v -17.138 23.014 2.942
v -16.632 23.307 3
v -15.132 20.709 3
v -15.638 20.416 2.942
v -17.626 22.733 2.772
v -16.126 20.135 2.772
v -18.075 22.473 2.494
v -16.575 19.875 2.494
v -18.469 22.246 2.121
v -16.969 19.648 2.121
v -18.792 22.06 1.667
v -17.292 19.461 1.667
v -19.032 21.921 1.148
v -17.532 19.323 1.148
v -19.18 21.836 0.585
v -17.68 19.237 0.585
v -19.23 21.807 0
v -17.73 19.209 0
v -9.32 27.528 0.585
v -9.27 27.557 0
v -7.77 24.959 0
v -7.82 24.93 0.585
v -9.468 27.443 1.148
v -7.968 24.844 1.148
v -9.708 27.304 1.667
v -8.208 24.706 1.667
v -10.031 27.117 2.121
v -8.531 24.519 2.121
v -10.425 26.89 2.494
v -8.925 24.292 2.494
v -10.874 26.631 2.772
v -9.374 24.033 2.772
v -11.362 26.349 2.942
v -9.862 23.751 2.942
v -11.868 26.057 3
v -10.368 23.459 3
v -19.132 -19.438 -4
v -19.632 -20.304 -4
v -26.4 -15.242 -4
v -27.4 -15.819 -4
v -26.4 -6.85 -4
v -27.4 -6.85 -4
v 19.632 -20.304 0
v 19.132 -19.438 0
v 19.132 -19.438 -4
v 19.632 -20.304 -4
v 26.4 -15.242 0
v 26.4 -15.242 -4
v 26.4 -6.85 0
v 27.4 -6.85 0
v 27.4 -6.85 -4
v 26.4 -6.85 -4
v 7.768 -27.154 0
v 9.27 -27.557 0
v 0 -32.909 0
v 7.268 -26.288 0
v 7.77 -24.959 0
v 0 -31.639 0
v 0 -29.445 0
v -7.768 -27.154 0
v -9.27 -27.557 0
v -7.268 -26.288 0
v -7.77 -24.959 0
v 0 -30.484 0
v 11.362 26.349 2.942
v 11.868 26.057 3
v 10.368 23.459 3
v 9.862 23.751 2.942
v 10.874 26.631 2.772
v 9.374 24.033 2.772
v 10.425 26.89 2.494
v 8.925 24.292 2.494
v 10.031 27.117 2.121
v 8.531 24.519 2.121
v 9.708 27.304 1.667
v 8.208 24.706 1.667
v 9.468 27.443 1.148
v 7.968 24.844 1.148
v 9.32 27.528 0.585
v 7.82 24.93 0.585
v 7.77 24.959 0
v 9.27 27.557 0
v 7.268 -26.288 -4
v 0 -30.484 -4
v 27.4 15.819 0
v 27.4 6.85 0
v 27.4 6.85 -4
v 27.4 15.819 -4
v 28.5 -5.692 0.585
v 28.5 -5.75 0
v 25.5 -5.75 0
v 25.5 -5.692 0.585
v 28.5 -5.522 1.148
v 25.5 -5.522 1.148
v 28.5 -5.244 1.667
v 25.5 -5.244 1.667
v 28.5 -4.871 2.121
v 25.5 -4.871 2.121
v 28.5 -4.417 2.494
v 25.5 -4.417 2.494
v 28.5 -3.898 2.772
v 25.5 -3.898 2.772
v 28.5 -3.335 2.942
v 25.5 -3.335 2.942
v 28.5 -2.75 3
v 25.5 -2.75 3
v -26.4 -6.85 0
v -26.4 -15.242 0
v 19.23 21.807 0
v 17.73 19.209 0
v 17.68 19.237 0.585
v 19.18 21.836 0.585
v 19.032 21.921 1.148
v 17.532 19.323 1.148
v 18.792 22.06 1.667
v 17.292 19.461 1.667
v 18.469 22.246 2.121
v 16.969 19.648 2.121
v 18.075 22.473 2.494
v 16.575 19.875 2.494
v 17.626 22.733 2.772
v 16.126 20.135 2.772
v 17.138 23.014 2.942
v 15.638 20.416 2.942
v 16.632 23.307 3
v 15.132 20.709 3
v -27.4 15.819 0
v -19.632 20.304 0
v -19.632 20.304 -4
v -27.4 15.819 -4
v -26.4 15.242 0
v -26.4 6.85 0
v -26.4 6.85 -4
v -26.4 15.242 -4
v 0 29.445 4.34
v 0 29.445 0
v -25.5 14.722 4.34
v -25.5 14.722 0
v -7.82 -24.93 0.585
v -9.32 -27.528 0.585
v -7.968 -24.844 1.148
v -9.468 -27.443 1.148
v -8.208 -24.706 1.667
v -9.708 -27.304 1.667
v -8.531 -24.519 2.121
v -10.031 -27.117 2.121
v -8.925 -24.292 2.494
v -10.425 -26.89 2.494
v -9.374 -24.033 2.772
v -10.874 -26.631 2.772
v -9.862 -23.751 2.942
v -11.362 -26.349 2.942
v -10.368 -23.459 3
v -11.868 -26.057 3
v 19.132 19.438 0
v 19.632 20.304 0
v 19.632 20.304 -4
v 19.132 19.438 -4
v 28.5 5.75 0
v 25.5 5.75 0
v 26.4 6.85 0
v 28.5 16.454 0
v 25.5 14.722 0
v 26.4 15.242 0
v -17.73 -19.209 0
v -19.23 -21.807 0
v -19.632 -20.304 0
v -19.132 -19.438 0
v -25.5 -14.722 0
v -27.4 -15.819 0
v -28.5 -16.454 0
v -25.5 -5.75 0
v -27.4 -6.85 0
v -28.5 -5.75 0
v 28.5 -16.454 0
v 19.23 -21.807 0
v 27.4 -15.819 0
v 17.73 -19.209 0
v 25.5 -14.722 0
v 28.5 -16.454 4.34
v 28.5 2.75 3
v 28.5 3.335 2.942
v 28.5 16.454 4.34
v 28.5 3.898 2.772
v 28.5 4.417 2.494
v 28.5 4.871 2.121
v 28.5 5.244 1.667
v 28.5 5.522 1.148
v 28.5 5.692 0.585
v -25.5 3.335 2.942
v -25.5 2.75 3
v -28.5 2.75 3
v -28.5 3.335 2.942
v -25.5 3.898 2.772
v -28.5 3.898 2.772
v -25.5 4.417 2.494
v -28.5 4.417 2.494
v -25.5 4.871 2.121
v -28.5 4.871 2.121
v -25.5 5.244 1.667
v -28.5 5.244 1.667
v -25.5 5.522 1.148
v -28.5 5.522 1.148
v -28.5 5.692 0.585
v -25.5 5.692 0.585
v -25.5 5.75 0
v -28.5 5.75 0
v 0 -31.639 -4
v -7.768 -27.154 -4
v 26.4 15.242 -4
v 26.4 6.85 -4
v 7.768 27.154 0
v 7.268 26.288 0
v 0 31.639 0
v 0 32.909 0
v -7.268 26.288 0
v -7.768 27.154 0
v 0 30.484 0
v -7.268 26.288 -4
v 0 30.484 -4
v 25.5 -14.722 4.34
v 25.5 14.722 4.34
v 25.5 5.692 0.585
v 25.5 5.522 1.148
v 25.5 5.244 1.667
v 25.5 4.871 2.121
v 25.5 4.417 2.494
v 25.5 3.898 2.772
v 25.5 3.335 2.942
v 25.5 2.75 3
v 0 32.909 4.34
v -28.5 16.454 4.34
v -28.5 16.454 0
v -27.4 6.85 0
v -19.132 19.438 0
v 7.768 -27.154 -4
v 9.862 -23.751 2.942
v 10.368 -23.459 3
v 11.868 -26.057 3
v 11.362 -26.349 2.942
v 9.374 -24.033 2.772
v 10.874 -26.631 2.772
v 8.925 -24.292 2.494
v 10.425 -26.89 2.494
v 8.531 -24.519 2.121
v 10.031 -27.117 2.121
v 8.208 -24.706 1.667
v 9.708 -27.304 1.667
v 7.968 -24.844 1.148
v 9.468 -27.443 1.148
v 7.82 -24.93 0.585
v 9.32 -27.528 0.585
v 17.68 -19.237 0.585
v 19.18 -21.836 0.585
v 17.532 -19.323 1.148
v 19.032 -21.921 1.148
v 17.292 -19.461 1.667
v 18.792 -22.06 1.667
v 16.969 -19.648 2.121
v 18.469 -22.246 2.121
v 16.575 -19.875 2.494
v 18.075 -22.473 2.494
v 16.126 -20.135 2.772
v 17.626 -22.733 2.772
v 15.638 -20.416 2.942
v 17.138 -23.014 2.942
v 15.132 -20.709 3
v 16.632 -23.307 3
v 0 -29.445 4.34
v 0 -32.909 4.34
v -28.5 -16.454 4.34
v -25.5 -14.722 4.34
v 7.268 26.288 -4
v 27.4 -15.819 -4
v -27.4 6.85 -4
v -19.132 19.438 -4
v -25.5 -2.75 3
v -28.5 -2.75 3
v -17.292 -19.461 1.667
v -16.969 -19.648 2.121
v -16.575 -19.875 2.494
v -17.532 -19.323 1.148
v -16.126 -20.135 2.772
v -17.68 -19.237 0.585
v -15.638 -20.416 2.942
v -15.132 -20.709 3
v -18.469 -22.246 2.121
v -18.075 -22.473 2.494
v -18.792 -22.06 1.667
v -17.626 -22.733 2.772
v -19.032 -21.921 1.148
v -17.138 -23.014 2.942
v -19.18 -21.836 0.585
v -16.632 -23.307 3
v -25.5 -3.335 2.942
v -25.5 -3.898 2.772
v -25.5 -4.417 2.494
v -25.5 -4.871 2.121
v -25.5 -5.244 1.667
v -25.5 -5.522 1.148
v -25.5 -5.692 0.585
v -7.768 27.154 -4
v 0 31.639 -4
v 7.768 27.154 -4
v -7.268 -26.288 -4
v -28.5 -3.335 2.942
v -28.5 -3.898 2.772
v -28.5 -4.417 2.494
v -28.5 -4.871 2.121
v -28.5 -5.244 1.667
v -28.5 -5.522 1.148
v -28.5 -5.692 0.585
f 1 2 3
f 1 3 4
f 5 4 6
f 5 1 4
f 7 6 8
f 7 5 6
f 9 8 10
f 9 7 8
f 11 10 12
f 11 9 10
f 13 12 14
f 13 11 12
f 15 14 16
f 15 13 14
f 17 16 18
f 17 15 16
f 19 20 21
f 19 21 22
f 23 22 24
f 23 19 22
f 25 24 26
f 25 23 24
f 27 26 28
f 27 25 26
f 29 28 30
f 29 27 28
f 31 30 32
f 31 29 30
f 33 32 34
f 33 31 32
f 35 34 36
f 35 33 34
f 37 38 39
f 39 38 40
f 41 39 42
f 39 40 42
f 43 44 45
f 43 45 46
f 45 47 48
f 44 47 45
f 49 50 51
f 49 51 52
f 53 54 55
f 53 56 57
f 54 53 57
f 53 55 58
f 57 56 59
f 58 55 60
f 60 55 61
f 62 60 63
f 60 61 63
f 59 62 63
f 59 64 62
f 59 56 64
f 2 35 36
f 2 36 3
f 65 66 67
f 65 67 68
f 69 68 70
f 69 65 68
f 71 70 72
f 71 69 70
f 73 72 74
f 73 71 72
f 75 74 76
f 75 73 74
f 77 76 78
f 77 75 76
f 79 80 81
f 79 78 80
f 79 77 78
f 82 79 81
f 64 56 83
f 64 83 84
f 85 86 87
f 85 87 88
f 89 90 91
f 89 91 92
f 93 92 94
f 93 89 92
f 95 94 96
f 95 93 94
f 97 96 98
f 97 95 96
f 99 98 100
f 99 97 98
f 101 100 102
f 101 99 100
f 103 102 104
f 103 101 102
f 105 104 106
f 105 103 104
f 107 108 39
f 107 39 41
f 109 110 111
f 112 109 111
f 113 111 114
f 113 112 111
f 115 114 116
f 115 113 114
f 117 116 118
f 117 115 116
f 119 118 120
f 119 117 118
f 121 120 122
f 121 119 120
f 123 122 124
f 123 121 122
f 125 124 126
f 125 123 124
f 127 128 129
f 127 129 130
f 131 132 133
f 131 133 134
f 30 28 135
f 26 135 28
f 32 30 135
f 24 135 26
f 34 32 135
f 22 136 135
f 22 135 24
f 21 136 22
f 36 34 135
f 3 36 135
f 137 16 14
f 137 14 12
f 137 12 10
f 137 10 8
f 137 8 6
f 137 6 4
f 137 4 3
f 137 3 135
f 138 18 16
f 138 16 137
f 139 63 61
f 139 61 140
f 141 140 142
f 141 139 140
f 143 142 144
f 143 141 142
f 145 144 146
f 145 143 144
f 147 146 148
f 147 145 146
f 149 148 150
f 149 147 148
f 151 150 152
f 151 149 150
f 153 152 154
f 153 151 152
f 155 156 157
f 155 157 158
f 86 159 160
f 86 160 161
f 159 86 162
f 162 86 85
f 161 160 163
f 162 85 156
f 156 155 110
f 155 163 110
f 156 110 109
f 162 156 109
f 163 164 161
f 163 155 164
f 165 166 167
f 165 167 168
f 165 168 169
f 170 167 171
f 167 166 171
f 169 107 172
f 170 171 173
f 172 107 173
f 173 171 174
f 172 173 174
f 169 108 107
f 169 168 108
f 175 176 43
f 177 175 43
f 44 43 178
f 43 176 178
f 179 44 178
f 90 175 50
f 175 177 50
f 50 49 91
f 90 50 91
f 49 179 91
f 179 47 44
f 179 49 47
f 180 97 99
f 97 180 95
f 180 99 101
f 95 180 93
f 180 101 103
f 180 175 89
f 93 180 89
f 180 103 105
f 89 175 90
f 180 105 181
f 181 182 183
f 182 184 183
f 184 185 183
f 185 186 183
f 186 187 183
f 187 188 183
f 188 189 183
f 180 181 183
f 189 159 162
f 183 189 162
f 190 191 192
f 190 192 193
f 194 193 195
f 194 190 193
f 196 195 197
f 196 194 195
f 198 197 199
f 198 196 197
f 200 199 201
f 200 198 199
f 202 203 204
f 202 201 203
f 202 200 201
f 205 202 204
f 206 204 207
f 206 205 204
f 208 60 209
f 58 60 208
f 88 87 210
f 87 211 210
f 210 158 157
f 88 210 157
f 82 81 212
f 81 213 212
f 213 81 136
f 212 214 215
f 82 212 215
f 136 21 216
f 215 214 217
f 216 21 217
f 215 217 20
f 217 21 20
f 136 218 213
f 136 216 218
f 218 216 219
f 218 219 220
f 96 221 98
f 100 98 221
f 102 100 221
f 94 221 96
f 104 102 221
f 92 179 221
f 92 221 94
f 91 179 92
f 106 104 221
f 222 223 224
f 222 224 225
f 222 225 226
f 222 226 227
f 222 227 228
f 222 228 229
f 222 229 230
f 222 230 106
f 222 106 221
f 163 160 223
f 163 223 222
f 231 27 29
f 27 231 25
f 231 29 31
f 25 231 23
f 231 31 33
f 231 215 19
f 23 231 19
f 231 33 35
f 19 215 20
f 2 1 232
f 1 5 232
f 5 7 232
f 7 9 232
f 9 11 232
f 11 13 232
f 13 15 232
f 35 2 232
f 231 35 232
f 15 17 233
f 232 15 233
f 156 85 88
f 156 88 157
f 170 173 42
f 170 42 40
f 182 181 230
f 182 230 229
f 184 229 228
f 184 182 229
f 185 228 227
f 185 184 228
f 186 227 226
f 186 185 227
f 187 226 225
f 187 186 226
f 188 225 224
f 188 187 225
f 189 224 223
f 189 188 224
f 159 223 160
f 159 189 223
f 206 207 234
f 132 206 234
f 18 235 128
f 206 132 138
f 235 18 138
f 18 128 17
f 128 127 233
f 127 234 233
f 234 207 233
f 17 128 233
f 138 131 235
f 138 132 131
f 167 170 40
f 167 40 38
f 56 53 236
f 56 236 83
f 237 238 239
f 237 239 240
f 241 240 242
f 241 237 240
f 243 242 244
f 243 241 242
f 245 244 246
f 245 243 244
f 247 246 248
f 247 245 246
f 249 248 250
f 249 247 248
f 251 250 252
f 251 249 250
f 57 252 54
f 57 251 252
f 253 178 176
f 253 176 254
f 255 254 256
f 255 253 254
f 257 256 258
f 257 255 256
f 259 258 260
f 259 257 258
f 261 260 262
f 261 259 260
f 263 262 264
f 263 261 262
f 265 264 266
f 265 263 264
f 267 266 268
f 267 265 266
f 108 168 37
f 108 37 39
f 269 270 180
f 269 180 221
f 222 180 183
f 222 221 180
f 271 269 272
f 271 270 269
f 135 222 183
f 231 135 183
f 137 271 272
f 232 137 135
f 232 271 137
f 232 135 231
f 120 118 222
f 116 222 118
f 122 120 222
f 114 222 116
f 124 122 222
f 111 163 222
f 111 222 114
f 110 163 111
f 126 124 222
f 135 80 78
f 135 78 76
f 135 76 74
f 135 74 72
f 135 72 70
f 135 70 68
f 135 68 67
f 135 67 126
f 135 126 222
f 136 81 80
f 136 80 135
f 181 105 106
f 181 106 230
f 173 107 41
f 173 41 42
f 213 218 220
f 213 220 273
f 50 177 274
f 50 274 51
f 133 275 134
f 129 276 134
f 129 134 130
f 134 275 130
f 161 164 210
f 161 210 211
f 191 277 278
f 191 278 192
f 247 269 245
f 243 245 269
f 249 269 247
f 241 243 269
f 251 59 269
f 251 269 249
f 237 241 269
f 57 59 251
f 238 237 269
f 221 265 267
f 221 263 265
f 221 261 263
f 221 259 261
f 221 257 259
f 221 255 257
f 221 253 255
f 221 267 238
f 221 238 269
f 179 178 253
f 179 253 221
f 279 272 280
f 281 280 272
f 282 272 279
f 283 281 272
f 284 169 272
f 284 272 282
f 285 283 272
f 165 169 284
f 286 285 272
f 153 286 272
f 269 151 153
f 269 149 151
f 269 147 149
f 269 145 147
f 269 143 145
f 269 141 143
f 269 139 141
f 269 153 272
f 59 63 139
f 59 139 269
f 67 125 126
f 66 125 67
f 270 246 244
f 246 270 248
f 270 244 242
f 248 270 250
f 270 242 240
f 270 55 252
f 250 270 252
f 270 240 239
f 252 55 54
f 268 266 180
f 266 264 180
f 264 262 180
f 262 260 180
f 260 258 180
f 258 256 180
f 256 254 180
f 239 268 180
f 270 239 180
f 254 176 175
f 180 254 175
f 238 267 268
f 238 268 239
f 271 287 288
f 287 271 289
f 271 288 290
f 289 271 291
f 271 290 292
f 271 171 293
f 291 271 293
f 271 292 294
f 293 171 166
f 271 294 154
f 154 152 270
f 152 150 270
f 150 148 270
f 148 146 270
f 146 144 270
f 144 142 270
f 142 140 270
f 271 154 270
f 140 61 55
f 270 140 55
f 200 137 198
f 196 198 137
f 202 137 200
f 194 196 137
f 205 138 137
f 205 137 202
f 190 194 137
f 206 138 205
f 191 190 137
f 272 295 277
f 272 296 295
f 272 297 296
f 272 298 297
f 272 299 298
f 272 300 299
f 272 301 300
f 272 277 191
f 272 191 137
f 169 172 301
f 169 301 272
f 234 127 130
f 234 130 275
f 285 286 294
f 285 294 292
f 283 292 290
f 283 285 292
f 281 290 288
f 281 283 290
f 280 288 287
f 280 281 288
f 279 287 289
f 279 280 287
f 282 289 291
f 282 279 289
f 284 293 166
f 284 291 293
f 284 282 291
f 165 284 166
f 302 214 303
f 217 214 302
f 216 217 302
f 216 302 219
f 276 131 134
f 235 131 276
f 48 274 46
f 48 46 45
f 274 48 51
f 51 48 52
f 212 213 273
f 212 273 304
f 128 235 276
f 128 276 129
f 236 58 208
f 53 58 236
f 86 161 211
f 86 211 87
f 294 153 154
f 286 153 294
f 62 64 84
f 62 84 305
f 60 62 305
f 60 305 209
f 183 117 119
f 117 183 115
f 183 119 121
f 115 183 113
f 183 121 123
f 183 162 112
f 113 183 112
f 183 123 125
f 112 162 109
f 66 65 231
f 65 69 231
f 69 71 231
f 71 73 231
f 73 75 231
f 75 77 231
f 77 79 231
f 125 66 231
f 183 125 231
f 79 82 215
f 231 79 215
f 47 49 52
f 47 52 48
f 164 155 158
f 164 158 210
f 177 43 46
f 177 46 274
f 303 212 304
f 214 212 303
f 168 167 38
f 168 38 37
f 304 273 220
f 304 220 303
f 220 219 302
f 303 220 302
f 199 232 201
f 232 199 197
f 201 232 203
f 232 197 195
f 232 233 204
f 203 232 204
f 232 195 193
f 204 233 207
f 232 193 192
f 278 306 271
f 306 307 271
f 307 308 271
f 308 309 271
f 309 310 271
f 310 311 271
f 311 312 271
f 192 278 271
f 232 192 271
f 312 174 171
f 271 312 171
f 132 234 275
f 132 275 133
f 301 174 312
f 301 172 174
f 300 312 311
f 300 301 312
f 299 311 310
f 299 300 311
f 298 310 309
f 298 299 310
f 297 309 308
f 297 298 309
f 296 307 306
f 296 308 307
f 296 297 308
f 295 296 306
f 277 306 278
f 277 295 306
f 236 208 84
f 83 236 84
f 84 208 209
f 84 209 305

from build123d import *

# Parameters (mm, degrees)
BOSS_EXTRUDE1_DEPTH = 4.34
CUT_EXTRUDE1_DEPTH  = 66.960864154
CUT_EXTRUDE2_REACH  = 73.855
CUT_EXTRUDE3_REACH  = 73.855
BOSS_EXTRUDE2_DEPTH = 4


with BuildPart() as part:
    # Sketch1 → Boss-Extrude1 (new body)
    with BuildSketch(Plane(origin=(0, 0, 0), x_dir=(0, 1, 0), z_dir=(0, 0, 1))):
        Polygon((32.908965344, 0), (16.454482672, 28.5), (-16.454482672, 28.5), (-32.908965344, 0), (-16.454482672, -28.5), (16.454482672, -28.5), align=None)
        Polygon((29.444863729, 0), (14.722431864, 25.5), (-14.722431864, 25.5), (-29.444863729, 0), (-14.722431864, -25.5), (14.722431864, -25.5), align=None, mode=Mode.SUBTRACT)
    extrude(amount=BOSS_EXTRUDE1_DEPTH)

    # Sketch2 → Cut-Extrude1 (cut, through all)
    with BuildSketch(Plane.YZ.offset(28.5)):
        with BuildLine():
            Line((-2.75, 3), (2.75, 3))
            ThreePointArc((2.75, 3), (5.75, 0), (2.75, -3))
            Line((2.75, -3), (-2.75, -3))
            ThreePointArc((-2.75, -3), (-5.75, 0), (-2.75, 3))
        make_face()
    extrude(amount=-CUT_EXTRUDE1_DEPTH, mode=Mode.SUBTRACT)

    # Cut-Extrude2: up to this face of the body (flat: up to its plane)
    cut_extrude2_end = Plane(part.part.faces().sort_by_distance((-14.25, -24.681724008, 2.17))[0])
    # Sketch3 → Cut-Extrude2 (cut, up to the picked face)
    with BuildSketch(Plane(origin=(14.25, 24.681724008, 0), x_dir=(-0.866025403784439, 0.4999999999999994, 0), z_dir=(0.4999999999999994, 0.866025403784439, 0)), mode=Mode.PRIVATE) as cut_extrude2_sk1:
        with BuildLine():
            Line((-2.75, 3), (2.75, 3))
            ThreePointArc((2.75, 3), (5.75, 0), (2.75, -3))
            Line((2.75, -3), (-2.75, -3))
            ThreePointArc((-2.75, -3), (-5.75, 0), (-2.75, 3))
        make_face()
    cut_extrude2_tool1 = split(extrude(cut_extrude2_sk1.sketch, amount=-CUT_EXTRUDE2_REACH, mode=Mode.PRIVATE), bisect_by=cut_extrude2_end, keep=Keep.BOTH, mode=Mode.PRIVATE)
    add(cut_extrude2_tool1.solids().sort_by(Axis((14.25, 24.681724, 0), (-0.4999999999999994, -0.866025403784439, 0)))[0], mode=Mode.SUBTRACT)

    # Cut-Extrude3: up to this face of the body (flat: up to its plane)
    cut_extrude3_end = Plane(part.part.faces().sort_by_distance((14.25, -24.681724008, 2.17))[0])
    # Sketch4 → Cut-Extrude3 (cut, up to the picked face)
    with BuildSketch(Plane(origin=(-14.25, 24.681724008, 0), x_dir=(-0.8660254037844384, -0.5000000000000004, 0), z_dir=(-0.5000000000000004, 0.8660254037844384, 0)), mode=Mode.PRIVATE) as cut_extrude3_sk1:
        with BuildLine():
            Line((-2.75, 3), (2.75, 3))
            ThreePointArc((2.75, 3), (5.75, 0), (2.75, -3))
            Line((2.75, -3), (-2.75, -3))
            ThreePointArc((-2.75, -3), (-5.75, 0), (-2.75, 3))
        make_face()
    cut_extrude3_tool1 = split(extrude(cut_extrude3_sk1.sketch, amount=-CUT_EXTRUDE3_REACH, mode=Mode.PRIVATE), bisect_by=cut_extrude3_end, keep=Keep.BOTH, mode=Mode.PRIVATE)
    add(cut_extrude3_tool1.solids().sort_by(Axis((-14.25, 24.681724, 0), (0.5000000000000004, -0.8660254037844384, 0)))[0], mode=Mode.SUBTRACT)

    # Sketch5 → Boss-Extrude2 (add)
    with BuildSketch(Plane(origin=(0, 0, 0), x_dir=(0, 1, 0), z_dir=(0, 0, 1))):
        Polygon((-20.304096064, 19.632274016), (-19.43807066, 19.132274016), (-15.242047107, 26.4), (-6.85, 26.4), (-6.85, 27.4), (-15.819397376, 27.4), align=None)
        Polygon((20.304096064, 19.632274016), (15.819397376, 27.4), (6.85, 27.4), (6.85, 26.4), (15.242047107, 26.4), (19.43807066, 19.132274016), align=None)
        Polygon((27.154096064, -7.767725984), (31.638794752, 0), (27.154096064, 7.767725984), (26.28807066, 7.267725984), (30.484094213, 0), (26.28807066, -7.267725984), align=None)
        Polygon((6.85, -27.4), (15.819397376, -27.4), (20.304096064, -19.632274016), (19.43807066, -19.132274016), (15.242047107, -26.4), (6.85, -26.4), align=None)
        Polygon((-20.304096064, -19.632274016), (-15.819397376, -27.4), (-6.85, -27.4), (-6.85, -26.4), (-15.242047107, -26.4), (-19.43807066, -19.132274016), align=None)
        Polygon((-27.154096064, 7.767725984), (-31.638794752, 0), (-27.154096064, -7.767725984), (-26.28807066, -7.267725984), (-30.484094213, 0), (-26.28807066, 7.267725984), align=None)
    extrude(amount=-BOSS_EXTRUDE2_DEPTH)


solid = part.part
